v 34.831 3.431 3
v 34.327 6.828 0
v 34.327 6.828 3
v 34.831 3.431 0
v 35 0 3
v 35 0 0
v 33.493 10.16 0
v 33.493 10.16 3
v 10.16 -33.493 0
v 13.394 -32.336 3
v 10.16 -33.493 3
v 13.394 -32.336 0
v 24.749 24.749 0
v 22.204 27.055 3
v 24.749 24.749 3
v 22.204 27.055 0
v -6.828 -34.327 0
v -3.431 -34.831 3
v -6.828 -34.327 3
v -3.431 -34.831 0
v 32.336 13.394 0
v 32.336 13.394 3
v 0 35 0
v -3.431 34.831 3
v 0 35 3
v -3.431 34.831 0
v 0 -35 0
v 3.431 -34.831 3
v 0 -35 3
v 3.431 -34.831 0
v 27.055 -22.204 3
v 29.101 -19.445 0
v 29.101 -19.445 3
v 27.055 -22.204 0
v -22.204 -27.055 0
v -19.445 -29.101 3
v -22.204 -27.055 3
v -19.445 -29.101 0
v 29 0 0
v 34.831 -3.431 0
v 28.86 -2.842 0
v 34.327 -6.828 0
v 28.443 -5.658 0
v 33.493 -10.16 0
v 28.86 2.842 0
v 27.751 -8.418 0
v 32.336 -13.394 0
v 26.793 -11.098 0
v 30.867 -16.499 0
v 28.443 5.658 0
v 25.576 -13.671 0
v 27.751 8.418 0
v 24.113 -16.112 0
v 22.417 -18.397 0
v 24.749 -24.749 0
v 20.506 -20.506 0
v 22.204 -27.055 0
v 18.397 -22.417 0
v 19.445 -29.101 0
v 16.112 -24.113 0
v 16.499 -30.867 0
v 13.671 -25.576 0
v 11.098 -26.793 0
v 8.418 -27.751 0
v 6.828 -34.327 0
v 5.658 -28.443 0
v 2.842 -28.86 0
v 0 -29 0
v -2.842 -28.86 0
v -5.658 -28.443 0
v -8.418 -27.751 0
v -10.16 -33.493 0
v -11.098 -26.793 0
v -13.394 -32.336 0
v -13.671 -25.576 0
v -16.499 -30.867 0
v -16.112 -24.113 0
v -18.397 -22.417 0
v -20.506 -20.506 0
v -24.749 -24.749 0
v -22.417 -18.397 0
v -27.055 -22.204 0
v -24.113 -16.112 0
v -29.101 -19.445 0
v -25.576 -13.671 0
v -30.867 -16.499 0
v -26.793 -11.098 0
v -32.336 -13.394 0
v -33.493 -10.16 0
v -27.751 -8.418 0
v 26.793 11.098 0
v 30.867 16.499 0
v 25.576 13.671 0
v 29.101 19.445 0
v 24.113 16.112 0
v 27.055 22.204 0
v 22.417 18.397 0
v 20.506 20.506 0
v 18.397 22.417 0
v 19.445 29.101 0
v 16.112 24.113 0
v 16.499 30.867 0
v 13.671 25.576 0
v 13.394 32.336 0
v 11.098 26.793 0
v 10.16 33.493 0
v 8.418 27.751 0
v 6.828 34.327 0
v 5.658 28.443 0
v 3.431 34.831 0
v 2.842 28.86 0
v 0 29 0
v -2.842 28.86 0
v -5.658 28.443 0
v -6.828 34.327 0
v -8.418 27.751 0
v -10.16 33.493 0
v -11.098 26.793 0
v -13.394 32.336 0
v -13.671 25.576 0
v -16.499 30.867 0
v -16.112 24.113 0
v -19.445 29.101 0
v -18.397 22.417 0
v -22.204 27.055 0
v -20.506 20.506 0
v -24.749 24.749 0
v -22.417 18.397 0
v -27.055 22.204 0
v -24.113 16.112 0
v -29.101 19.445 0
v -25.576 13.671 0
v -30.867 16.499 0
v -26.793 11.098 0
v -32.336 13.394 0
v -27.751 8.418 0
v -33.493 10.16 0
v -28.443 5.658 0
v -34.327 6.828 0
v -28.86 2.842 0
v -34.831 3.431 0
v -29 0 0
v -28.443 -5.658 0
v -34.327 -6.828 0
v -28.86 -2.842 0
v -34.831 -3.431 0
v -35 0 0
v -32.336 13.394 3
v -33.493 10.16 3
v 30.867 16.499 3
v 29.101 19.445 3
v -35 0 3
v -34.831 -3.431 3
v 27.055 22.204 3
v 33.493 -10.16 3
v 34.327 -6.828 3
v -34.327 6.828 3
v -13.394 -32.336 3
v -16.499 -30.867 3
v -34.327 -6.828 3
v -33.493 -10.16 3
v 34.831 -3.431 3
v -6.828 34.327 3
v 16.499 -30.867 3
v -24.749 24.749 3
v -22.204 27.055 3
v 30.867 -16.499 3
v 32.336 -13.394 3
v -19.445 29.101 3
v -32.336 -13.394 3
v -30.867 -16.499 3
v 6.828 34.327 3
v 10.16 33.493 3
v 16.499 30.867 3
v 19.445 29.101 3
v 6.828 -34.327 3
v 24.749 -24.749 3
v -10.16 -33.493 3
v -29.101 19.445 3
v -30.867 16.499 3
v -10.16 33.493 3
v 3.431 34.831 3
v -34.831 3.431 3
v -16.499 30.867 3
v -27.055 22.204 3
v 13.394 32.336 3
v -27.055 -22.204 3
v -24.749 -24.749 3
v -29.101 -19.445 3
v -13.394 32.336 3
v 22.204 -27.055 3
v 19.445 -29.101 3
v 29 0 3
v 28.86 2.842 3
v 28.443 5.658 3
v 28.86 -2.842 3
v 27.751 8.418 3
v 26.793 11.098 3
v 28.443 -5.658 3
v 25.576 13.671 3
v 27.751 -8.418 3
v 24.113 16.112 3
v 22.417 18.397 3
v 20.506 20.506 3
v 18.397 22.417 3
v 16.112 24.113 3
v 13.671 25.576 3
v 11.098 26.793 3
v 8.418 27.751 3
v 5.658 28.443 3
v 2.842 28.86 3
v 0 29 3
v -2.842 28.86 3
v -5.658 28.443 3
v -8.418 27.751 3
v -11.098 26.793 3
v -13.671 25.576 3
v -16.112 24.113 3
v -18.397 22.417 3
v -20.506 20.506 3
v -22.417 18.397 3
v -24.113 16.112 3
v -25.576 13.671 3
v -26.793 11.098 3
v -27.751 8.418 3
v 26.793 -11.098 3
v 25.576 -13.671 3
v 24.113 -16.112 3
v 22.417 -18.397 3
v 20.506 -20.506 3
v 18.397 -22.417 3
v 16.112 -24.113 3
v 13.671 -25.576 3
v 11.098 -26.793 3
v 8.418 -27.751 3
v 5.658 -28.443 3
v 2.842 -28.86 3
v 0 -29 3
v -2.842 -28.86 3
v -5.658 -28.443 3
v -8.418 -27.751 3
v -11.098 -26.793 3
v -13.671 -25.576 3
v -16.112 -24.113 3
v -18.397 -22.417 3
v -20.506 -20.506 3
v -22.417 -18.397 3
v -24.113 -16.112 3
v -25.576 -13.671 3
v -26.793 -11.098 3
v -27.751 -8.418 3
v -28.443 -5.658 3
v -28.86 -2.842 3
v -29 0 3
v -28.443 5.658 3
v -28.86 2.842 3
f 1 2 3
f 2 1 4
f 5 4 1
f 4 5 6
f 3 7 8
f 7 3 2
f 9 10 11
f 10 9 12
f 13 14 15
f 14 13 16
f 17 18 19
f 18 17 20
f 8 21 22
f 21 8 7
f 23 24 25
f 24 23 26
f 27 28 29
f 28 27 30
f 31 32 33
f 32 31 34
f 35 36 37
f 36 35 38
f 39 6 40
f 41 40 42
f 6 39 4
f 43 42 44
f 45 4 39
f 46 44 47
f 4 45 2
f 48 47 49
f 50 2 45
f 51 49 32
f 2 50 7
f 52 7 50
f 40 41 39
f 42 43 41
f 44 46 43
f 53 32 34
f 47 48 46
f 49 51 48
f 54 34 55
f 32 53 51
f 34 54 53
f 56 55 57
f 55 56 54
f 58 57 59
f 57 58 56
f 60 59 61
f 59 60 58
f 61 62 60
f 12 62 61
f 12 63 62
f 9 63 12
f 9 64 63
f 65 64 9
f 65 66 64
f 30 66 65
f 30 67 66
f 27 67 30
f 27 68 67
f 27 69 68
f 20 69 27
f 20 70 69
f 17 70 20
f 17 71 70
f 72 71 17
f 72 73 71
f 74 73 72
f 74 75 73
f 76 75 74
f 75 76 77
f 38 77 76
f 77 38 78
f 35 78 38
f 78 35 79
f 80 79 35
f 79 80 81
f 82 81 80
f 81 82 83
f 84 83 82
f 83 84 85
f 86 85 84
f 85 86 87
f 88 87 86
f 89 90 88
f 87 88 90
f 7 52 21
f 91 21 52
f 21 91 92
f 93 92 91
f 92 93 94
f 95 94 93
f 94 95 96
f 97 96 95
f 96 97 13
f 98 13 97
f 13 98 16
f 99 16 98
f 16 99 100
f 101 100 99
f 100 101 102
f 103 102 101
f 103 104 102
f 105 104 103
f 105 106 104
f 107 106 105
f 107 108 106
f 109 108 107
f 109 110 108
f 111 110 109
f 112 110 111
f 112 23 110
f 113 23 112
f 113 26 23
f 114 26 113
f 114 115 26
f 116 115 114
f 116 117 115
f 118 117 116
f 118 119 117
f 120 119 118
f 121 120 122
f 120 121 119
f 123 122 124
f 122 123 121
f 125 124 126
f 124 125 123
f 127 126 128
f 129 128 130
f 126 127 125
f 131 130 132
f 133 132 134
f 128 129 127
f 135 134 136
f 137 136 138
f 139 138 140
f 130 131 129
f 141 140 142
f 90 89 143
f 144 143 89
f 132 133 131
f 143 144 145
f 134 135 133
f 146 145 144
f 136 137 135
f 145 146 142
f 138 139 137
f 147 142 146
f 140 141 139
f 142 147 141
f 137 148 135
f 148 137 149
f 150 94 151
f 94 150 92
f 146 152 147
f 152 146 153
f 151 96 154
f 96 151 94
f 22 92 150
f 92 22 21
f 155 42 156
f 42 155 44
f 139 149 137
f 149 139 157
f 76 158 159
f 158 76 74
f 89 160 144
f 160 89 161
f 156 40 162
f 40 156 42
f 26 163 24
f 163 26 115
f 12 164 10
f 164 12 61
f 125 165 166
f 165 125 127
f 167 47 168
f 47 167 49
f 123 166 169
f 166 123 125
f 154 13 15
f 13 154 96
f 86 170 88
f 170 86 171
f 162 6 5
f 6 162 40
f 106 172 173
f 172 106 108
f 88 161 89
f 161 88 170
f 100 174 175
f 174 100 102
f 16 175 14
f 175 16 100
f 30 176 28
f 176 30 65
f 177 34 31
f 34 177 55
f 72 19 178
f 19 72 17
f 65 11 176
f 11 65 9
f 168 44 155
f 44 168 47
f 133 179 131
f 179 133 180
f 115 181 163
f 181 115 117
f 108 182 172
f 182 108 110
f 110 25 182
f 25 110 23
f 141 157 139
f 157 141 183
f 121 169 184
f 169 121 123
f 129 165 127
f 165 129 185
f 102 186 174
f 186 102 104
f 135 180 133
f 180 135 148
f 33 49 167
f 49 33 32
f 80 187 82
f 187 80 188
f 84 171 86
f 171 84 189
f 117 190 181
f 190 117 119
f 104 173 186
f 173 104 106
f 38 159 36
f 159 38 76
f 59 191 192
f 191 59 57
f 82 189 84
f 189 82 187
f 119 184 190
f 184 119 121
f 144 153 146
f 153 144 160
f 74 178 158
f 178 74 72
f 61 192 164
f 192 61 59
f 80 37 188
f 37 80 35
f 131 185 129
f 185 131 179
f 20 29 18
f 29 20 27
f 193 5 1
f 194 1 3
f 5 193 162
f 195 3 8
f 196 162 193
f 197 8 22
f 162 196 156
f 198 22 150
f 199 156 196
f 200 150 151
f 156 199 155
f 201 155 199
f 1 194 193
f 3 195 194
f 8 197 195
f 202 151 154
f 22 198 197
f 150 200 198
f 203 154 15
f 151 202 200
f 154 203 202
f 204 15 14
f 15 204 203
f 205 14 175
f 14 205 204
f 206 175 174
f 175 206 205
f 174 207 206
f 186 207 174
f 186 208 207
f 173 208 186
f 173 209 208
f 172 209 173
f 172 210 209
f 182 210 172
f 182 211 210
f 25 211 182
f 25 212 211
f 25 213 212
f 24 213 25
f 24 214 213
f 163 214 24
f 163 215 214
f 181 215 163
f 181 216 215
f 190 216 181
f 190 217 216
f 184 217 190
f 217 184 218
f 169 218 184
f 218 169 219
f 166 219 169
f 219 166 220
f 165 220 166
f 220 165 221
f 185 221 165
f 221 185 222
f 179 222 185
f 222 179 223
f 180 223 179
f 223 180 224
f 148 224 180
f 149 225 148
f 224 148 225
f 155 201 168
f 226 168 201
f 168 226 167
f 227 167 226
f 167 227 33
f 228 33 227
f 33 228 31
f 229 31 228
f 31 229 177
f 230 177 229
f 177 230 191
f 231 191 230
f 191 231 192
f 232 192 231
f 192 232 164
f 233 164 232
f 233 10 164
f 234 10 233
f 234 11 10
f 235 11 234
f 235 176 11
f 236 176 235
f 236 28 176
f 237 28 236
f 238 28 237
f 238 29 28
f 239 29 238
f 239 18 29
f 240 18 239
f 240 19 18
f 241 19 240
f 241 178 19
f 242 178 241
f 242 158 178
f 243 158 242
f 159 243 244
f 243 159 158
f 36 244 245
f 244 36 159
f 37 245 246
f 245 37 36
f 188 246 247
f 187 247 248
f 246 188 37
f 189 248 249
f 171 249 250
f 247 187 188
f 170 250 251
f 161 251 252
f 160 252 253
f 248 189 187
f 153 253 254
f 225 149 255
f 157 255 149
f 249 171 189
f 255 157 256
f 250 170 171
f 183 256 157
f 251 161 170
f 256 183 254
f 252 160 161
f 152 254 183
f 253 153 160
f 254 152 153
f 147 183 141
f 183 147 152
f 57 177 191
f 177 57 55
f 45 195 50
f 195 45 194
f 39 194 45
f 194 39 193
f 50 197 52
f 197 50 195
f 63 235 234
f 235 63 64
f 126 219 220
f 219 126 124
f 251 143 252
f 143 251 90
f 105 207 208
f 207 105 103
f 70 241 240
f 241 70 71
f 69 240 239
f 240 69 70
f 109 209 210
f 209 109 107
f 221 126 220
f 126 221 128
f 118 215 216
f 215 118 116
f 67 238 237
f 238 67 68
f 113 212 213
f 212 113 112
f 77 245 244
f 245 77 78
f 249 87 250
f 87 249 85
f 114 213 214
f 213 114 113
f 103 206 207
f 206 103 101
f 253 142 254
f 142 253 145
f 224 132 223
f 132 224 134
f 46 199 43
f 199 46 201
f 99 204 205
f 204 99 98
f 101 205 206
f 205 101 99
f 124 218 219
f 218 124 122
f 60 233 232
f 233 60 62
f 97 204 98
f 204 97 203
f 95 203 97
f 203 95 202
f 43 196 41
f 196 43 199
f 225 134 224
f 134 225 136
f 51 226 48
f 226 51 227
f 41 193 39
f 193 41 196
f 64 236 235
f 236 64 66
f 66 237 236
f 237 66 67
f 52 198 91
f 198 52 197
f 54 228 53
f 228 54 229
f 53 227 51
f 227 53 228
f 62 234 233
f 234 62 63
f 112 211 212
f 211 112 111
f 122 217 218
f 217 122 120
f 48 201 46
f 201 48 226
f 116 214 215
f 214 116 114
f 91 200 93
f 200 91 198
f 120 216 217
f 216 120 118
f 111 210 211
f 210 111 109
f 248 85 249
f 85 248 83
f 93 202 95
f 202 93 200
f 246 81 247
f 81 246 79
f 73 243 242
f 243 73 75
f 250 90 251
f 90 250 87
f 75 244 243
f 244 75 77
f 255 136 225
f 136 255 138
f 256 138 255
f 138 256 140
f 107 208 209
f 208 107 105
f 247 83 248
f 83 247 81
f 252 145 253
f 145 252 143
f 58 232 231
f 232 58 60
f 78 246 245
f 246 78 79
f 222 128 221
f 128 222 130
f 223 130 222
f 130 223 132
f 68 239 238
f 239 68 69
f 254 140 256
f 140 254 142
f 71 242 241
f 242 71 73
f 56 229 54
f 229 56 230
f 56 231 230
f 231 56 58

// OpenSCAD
// Lid insert remix for VL53L3CX + BME280 on a ~70mm canning-lid style disk.
// Units: millimeters
//
// Which part to render (GUI Customizer dropdown, or edit PART below):
//   lid_insert     — ToF optical window + BME280 vent (~70 mm disk)
//   board_adapter  — Feather / XIAO board pocket
//
// CLI:
//   openscad -o lid_insert_vl53l3cx_bme280.stl -D 'PART="lid_insert"' lid_insert_vl53l3cx_bme280.scad
//   openscad -o board_adapter_nrf52840.stl -D 'PART="board_adapter"' lid_insert_vl53l3cx_bme280.scad
// Or: ./scripts/render_enclosure.sh

$fn = 64;

/* [Part] */
PART = "lid_insert"; // [lid_insert, board_adapter]

lid_od = 70;
lid_id = 62;
thickness = 3;

// VL53L3CX aperture — keep dough farther than 10 mm (prefer ≥ 30 mm)
tof_window_d = 8;
tof_offset_y = 8;

// BME280 breakout clearance / vent
bme_w = 16;
bme_h = 12;
bme_offset_y = -18;

module board_adapter() {
  difference() {
    cube([55, 30, 4], center = true);
    translate([0, 0, 1]) cube([51, 23, 4], center = true);
    for (x = [-22, 22], y = [-10, 10])
      translate([x, y, 0]) cylinder(h = 10, d = 2.4, center = true);
  }
}

module lid_insert() {
  difference() {
    cylinder(h = thickness, d = lid_od);
    translate([0, 0, -1]) cylinder(h = thickness + 2, d = lid_id - 4);

    // ToF optical window (centered on sensor FOV)
    translate([0, tof_offset_y, -1])
      cylinder(h = thickness + 2, d = tof_window_d);

    // BME280 vent / recess
    translate([0, bme_offset_y, thickness / 2])
      cube([bme_w, bme_h, thickness + 2], center = true);
  }
}

if (PART == "board_adapter") {
  board_adapter();
} else {
  lid_insert();
}
